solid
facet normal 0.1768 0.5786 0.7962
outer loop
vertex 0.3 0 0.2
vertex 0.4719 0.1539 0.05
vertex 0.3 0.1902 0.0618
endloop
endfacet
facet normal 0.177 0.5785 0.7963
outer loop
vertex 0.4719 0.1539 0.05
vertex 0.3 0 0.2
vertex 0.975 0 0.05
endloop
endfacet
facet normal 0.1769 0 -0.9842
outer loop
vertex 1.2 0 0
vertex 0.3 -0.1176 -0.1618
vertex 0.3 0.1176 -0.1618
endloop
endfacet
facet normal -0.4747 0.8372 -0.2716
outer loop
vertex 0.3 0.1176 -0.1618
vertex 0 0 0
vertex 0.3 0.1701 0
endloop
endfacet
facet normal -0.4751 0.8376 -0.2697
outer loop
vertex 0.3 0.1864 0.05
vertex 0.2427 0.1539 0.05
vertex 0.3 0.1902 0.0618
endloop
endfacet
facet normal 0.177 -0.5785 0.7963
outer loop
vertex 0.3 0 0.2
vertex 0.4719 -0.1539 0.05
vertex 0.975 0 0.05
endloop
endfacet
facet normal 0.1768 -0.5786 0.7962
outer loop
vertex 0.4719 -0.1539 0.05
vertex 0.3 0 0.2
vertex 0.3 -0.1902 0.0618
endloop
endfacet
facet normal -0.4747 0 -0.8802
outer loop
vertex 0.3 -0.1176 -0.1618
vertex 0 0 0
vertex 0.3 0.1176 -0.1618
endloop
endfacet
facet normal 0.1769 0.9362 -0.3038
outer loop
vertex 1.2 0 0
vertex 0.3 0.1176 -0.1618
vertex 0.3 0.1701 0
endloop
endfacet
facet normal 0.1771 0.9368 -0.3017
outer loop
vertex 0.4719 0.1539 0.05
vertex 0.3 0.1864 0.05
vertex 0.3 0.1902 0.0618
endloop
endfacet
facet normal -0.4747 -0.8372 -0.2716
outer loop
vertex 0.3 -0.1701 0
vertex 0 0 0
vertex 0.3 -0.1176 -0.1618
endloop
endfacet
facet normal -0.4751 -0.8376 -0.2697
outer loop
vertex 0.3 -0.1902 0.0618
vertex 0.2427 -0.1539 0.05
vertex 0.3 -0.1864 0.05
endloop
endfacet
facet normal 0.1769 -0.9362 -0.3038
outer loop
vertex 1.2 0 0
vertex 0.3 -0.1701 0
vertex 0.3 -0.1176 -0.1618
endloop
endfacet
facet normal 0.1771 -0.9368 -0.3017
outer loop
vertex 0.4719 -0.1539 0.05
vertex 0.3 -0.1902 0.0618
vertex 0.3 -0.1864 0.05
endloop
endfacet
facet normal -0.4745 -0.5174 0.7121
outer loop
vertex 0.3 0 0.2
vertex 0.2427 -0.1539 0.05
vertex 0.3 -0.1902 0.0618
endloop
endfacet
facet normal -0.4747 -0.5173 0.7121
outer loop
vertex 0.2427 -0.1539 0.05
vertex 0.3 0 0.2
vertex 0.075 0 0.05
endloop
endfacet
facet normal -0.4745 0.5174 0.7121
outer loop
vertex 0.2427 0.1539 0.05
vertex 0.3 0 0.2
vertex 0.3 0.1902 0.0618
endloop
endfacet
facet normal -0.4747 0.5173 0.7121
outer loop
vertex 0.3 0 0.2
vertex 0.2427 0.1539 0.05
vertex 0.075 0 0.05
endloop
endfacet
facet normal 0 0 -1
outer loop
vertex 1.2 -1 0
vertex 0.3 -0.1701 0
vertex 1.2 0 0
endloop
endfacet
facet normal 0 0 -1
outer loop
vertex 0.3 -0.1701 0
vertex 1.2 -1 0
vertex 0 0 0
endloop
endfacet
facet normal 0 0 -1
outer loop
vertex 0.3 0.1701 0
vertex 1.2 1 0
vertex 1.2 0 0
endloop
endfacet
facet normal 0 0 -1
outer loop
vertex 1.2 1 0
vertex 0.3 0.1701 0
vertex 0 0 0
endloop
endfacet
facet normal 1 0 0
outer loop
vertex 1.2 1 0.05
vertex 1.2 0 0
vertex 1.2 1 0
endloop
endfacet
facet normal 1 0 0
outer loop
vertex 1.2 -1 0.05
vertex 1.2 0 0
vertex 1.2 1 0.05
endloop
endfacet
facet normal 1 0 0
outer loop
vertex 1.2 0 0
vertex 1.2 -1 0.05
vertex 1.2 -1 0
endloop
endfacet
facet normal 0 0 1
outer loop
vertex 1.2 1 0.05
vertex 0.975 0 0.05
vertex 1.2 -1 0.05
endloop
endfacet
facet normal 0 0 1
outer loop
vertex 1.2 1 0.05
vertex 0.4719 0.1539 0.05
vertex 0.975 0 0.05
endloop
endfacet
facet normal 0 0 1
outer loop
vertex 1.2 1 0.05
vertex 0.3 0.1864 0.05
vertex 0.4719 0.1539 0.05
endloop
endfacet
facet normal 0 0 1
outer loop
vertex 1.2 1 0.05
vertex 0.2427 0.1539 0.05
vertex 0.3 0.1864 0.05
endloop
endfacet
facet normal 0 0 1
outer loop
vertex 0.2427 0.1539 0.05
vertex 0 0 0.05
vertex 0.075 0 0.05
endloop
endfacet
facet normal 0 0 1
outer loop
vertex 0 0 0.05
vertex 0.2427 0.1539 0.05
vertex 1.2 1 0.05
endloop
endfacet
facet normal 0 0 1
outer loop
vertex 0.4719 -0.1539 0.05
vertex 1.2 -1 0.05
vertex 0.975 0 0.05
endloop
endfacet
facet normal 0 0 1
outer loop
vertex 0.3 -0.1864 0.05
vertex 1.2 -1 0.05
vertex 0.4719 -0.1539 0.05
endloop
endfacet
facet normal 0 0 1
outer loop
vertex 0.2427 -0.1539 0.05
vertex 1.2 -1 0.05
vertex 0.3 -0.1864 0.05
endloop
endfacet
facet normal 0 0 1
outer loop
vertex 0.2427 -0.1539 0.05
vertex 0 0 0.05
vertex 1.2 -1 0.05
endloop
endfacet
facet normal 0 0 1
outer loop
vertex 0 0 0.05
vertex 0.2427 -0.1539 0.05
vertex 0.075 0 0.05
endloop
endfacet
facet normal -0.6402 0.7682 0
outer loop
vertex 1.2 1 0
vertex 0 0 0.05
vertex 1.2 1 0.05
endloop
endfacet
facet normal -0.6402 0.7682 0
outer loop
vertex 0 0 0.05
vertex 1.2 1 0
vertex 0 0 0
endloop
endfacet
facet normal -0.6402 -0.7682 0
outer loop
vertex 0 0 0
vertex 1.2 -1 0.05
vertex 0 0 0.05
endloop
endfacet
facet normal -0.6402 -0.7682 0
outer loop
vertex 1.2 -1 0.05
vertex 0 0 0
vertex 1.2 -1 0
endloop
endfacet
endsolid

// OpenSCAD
wingspan = 1.0;
length = 1.2;

module wing() {
    linear_extrude(height=0.05) {
        polygon([
            [0, 0],
            [length, wingspan],
            [length, 0]]);
    }
}

rotate([0, 90, 0]) rotate_extrude() polygon([
    [0, 0],
    [0.2*wingspan, length/4],
    [0, length]]);

wing();
mirror([0, 1, 0]) wing();
